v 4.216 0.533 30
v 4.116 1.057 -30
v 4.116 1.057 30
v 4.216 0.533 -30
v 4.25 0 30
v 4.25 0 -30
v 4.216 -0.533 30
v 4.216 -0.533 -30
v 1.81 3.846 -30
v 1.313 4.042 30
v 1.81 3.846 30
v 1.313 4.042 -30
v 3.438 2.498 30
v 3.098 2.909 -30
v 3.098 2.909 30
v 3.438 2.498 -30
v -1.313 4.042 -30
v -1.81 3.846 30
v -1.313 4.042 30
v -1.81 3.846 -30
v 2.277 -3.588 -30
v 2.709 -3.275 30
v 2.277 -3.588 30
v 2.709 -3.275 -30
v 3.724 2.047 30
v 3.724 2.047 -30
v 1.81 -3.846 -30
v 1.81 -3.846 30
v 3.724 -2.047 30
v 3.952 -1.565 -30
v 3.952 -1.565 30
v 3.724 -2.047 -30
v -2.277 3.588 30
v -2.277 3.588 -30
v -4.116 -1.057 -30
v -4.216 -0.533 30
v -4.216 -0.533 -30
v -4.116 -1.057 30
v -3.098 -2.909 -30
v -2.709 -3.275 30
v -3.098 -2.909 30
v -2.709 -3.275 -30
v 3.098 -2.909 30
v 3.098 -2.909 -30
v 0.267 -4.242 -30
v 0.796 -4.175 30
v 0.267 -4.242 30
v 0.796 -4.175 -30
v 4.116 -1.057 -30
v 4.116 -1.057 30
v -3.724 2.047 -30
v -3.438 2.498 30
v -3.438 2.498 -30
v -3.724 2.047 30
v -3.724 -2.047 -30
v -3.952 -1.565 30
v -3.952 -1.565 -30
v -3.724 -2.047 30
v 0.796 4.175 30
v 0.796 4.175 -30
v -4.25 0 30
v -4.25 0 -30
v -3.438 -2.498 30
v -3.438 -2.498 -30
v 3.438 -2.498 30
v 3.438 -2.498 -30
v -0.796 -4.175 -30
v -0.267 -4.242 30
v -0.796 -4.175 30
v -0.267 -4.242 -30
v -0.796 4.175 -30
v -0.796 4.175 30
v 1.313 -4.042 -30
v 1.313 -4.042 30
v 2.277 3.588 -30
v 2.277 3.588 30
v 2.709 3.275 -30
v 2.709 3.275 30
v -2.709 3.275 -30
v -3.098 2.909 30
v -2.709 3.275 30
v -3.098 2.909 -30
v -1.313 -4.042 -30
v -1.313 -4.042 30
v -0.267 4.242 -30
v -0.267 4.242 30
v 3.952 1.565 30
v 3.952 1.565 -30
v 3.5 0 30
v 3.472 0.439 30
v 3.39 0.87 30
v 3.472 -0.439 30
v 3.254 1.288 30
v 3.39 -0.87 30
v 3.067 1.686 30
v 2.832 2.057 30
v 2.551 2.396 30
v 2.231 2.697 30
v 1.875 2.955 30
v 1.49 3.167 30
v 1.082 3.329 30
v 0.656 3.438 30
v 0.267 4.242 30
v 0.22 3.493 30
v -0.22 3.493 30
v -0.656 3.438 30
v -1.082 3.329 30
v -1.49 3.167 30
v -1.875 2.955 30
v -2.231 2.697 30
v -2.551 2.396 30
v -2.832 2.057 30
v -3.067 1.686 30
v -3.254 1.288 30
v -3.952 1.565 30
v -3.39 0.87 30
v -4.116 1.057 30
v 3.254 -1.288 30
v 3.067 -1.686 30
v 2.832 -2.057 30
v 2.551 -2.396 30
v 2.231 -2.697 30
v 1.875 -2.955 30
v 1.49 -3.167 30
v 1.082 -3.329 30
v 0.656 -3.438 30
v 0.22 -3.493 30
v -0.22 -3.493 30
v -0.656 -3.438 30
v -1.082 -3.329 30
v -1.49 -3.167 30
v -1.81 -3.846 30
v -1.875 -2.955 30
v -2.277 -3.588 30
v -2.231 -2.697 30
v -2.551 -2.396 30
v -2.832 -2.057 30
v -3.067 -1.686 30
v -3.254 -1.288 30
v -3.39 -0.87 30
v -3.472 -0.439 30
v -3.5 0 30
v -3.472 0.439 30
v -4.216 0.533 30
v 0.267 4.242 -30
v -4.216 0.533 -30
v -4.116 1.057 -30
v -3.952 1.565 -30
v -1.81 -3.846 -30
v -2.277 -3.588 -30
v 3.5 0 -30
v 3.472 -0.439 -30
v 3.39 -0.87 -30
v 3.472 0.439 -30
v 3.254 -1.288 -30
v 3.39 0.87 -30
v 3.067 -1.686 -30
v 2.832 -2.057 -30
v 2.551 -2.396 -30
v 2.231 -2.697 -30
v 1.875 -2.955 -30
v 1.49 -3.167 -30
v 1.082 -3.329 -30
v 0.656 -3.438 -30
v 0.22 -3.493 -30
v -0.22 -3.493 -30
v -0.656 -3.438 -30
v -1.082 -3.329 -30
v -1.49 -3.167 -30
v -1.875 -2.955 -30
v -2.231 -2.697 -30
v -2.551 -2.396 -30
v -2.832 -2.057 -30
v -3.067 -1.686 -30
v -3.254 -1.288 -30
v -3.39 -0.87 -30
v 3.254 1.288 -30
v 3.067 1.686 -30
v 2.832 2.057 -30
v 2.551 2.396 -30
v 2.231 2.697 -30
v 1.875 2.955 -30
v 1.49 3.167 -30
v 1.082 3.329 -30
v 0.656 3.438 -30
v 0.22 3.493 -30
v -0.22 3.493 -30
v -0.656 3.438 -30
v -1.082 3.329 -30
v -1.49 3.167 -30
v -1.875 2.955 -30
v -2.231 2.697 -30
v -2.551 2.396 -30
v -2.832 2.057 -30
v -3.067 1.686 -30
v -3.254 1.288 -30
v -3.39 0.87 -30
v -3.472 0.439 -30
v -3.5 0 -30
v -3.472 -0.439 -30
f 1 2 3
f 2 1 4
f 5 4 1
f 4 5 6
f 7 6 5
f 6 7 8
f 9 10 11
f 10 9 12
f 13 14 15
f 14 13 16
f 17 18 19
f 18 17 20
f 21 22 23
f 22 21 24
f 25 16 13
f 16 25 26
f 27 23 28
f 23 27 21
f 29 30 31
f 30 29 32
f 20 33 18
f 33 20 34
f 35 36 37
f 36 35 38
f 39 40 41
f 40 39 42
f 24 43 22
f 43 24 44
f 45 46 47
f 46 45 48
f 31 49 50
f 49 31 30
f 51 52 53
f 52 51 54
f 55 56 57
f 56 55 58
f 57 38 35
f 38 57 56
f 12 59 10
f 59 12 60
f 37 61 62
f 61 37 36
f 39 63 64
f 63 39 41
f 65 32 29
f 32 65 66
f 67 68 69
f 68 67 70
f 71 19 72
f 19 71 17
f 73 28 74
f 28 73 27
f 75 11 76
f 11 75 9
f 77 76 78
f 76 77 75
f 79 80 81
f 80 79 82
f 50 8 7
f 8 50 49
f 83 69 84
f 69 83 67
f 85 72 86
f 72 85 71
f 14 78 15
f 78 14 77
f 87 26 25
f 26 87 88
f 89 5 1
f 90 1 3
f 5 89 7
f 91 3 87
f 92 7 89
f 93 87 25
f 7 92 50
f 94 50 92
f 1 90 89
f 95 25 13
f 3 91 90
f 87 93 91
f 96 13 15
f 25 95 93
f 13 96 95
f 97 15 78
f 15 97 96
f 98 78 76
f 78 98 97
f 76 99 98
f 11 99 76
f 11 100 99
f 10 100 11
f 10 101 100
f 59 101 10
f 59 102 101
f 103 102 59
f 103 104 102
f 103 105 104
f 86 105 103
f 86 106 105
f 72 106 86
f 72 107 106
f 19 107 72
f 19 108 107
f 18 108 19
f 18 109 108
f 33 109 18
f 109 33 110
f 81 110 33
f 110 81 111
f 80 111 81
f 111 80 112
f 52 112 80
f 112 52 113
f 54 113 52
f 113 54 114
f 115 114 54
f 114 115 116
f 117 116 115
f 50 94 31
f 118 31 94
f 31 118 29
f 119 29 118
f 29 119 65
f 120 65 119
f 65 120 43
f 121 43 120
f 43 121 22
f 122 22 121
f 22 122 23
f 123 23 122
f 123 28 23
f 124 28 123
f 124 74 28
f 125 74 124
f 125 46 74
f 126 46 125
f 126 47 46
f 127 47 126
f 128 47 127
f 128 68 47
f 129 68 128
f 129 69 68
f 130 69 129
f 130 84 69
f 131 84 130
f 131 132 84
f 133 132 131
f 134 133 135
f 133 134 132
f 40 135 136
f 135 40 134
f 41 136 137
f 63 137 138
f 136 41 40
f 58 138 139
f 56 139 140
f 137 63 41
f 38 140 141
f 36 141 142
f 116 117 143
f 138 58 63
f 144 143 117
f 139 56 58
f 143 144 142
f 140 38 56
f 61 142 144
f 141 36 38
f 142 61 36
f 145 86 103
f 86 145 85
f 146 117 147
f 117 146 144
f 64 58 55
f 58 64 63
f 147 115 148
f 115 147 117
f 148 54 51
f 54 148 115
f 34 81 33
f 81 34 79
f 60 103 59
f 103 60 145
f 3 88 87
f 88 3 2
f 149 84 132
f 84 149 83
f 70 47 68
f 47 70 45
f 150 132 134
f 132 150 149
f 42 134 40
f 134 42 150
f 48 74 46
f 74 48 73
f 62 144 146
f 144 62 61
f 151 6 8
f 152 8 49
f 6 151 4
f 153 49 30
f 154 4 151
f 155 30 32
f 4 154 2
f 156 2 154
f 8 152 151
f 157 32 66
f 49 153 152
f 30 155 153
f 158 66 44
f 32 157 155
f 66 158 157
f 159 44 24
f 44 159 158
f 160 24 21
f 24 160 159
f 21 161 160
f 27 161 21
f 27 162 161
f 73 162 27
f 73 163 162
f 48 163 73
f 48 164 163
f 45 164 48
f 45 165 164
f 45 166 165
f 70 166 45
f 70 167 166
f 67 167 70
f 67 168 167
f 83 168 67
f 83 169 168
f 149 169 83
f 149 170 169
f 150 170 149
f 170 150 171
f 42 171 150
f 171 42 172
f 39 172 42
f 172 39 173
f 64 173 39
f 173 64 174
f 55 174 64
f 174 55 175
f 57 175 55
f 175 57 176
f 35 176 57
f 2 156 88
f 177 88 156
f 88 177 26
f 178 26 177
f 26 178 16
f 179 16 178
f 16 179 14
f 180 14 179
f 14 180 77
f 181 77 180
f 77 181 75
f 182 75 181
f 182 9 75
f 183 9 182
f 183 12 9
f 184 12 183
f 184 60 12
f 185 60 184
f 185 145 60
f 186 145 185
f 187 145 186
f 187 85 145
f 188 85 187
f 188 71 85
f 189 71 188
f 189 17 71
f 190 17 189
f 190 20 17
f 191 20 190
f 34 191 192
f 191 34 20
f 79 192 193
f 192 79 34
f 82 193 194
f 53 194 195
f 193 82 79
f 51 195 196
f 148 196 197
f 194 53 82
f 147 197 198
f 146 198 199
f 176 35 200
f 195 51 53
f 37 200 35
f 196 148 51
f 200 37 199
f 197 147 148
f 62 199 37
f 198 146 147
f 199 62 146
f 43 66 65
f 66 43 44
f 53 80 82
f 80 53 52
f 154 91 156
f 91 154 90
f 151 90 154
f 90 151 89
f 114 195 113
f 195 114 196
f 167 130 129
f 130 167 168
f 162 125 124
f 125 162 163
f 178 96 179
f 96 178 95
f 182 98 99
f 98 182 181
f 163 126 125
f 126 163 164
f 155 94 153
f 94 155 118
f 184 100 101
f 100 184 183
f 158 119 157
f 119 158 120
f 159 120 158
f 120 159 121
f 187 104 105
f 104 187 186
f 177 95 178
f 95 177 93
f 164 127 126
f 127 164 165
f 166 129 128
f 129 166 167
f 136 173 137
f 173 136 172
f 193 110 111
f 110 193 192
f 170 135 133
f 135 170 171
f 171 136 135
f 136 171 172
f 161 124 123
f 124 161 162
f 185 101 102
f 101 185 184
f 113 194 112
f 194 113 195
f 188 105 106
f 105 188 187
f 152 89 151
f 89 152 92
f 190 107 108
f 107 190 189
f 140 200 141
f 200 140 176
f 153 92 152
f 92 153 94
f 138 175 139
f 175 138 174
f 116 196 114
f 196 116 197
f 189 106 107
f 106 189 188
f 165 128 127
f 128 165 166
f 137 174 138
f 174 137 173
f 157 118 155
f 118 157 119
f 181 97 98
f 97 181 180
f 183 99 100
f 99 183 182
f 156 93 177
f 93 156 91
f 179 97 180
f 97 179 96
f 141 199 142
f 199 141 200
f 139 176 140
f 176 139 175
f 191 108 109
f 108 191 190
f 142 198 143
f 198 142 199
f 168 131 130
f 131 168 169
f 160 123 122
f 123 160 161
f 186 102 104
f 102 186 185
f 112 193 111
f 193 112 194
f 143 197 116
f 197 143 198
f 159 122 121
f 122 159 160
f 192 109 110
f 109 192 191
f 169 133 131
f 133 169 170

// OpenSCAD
$fn = 50;


difference() {
	union() {
		translate(v = [0, 0, -30.0000000000]) {
			cylinder(h = 60, r = 4.2500000000);
		}
	}
	union() {
		translate(v = [0, 0, -100.0000000000]) {
			cylinder(h = 200, r = 3.5000000000);
		}
	}
}
